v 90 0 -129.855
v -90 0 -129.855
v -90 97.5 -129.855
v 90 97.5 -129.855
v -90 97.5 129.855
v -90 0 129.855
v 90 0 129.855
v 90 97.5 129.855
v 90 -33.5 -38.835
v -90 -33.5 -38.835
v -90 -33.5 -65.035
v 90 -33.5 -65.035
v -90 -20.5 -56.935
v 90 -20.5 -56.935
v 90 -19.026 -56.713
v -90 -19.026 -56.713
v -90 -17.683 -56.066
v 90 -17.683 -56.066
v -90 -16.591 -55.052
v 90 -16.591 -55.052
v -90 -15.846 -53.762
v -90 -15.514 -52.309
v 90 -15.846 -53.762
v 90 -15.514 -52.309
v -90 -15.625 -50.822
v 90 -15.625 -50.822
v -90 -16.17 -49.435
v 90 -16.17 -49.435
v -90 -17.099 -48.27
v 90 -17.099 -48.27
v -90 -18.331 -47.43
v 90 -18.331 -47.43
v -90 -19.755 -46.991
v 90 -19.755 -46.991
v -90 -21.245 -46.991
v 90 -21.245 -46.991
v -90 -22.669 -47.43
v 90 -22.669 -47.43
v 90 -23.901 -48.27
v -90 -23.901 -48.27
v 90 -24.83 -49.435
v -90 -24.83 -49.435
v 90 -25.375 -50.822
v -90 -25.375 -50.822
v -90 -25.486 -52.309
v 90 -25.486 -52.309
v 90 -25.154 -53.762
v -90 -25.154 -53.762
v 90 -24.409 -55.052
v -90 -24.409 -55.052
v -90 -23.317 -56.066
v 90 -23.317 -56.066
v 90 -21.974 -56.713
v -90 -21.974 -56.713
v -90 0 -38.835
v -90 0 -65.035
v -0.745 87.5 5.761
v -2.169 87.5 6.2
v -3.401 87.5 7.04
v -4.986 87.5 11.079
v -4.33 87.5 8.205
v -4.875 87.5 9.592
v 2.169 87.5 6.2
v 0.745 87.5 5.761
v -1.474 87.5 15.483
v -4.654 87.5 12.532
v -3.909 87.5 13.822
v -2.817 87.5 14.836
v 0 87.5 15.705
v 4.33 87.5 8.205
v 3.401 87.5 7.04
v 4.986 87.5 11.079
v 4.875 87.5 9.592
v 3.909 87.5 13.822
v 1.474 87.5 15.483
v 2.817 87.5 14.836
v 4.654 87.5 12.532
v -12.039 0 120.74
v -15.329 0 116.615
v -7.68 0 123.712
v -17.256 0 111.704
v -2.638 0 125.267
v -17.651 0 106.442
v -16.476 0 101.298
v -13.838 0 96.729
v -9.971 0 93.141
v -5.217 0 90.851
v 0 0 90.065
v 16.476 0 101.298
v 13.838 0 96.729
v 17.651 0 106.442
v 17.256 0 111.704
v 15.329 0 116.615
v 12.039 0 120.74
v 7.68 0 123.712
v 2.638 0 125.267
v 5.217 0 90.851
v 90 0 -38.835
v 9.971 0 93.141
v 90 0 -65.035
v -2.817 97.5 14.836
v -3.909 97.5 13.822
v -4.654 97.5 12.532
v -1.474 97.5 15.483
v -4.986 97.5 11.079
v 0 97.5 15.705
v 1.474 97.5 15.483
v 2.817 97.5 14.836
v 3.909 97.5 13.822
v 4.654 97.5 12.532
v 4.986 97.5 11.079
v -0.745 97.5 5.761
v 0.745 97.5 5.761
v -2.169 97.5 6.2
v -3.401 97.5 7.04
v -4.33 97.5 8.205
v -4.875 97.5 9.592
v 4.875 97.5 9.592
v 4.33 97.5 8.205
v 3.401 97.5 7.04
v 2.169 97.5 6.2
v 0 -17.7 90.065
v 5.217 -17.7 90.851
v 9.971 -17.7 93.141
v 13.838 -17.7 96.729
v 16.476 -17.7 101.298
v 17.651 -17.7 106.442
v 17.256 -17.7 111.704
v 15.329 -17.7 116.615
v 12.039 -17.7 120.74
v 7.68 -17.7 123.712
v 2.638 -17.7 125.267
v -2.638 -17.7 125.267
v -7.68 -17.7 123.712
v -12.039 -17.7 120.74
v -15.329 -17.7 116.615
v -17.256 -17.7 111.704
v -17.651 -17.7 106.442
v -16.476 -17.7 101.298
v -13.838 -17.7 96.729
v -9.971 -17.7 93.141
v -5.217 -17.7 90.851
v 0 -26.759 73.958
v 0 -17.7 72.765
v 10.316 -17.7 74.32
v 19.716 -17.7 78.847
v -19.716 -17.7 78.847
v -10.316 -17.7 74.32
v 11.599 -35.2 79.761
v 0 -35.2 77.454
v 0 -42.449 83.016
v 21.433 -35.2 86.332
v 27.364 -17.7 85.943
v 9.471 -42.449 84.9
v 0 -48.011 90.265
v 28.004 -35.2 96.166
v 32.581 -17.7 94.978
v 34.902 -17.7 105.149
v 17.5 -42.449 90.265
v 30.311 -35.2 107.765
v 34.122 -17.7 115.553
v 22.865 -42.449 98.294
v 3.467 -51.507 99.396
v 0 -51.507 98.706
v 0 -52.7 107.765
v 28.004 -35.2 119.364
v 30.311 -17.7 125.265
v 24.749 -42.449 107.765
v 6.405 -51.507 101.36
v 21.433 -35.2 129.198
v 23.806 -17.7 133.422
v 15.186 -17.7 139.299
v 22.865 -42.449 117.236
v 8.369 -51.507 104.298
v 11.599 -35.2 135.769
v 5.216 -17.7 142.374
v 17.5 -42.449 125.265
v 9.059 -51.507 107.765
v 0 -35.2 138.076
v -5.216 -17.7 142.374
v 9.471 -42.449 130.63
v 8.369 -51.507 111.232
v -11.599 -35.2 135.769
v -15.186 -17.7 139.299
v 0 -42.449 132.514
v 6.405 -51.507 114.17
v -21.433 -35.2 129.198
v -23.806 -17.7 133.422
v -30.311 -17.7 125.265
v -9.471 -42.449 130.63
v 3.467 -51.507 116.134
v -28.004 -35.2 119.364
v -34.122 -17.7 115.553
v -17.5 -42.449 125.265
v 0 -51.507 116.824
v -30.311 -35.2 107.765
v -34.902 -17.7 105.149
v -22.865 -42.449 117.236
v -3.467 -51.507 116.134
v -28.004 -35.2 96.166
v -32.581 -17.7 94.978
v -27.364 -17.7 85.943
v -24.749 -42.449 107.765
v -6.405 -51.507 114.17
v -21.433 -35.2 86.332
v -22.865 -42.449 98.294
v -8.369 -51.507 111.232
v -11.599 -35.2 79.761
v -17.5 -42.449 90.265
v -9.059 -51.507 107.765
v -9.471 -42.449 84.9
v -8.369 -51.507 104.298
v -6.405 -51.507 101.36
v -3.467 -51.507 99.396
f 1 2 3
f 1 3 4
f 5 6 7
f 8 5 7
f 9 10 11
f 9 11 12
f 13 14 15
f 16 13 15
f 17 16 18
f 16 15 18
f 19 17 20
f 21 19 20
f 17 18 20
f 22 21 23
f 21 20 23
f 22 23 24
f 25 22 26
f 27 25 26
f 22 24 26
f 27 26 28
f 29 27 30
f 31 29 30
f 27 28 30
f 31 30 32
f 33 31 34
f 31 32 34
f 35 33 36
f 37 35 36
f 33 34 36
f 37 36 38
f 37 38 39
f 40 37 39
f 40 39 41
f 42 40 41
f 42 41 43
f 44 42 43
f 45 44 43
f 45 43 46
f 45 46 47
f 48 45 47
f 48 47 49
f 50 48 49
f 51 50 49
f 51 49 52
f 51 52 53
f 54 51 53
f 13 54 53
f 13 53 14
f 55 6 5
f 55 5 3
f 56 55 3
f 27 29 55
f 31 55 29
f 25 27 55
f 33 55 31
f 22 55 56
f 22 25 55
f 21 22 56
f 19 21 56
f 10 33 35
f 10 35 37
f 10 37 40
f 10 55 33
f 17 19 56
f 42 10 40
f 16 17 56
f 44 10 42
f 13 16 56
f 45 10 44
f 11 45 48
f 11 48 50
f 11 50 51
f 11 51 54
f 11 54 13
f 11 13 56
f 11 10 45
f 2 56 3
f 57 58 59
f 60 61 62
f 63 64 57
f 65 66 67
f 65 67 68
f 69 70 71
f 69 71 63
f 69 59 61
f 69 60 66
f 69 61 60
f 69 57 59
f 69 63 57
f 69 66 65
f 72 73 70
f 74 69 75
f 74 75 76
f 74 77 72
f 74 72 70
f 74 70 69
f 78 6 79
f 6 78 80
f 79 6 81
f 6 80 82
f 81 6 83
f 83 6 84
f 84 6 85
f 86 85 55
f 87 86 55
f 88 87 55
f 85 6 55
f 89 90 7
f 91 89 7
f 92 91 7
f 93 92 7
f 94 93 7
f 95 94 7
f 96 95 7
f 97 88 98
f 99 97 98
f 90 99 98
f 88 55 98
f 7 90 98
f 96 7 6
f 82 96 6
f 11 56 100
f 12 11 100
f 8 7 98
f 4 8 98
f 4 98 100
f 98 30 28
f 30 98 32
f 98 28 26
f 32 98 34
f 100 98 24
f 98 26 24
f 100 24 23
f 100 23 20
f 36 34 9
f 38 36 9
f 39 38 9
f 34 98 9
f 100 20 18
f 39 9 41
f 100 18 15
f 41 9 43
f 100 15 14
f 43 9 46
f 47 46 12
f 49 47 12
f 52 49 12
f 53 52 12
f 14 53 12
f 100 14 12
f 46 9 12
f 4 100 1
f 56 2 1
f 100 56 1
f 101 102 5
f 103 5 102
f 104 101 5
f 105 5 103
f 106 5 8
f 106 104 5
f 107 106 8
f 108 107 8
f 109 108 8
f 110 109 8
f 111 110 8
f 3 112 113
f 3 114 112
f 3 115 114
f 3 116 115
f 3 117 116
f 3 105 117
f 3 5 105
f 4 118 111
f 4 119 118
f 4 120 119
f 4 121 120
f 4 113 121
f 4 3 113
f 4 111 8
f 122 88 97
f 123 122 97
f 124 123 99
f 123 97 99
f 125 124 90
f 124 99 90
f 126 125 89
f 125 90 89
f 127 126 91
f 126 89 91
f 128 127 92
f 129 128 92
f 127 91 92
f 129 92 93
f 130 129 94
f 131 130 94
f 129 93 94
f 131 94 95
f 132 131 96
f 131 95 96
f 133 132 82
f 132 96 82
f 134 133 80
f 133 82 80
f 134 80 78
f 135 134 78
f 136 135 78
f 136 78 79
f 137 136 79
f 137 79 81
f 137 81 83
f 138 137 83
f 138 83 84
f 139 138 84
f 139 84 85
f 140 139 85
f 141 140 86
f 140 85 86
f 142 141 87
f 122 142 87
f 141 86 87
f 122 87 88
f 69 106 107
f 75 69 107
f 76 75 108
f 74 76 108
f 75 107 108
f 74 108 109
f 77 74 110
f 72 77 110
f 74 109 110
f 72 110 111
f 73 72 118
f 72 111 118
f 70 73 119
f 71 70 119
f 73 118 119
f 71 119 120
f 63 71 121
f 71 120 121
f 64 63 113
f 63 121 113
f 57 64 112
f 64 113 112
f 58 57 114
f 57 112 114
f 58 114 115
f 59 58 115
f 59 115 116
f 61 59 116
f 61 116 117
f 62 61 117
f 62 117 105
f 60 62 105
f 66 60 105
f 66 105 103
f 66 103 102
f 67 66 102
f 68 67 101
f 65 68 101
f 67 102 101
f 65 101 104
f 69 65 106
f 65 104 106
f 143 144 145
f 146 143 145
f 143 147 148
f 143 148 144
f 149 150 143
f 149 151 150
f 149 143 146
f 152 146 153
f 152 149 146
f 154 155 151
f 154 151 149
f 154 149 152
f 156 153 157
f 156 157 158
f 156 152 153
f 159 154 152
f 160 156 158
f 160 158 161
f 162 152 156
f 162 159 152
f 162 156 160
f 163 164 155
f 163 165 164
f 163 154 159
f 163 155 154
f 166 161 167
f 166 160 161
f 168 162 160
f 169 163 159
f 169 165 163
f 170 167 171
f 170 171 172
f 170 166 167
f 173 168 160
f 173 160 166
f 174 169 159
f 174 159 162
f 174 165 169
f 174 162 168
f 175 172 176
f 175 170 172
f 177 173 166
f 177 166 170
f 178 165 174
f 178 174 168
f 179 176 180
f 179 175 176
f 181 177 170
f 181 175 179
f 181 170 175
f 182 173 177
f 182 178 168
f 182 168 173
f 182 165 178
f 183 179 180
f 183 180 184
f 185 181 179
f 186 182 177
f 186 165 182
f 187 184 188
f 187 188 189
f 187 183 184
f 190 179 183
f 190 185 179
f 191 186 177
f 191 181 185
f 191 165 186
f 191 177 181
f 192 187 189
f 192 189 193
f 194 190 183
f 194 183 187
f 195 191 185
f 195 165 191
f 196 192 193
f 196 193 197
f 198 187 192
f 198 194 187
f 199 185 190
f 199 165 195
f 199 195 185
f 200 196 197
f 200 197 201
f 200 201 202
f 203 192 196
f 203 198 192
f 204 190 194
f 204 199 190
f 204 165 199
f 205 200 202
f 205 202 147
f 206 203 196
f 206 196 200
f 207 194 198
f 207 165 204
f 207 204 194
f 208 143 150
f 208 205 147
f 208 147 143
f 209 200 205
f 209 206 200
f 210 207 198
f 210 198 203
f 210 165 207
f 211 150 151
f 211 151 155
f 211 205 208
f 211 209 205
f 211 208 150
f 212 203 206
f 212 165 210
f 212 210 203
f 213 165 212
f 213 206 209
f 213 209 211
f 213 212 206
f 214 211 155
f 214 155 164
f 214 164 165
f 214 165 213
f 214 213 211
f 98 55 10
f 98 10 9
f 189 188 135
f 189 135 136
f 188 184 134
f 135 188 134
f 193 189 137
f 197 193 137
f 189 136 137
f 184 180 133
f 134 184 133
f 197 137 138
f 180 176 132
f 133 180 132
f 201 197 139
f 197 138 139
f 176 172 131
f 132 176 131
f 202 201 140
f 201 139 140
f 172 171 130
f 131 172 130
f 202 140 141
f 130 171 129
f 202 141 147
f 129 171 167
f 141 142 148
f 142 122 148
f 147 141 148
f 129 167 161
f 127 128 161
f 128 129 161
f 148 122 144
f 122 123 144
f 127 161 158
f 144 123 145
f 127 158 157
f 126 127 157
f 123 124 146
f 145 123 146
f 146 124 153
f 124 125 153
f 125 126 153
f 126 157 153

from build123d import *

# Parameters (mm, degrees)
SKETCH2_W           = 180
SKETCH2_H           = 259.71
BOSS_EXTRUDE1_DEPTH = 97.5
SKETCH4_R           = 17.7
BOSS_EXTRUDE2_DEPTH = 17.7
SKETCH5_R           = 35
BOSS_EXTRUDE3_DEPTH = 35
FILLET2_R           = 35
SKETCH8_W           = 180
SKETCH8_H           = 26.2
BOSS_EXTRUDE4_DEPTH = 33.5
SKETCH9_R           = 5
CUT_EXTRUDE1_DEPTH  = 250.575830668
SKETCH10_R          = 5
CUT_EXTRUDE2_DEPTH  = 10


with BuildPart() as part:
    # Sketch2 → Boss-Extrude1 (new body)
    with BuildSketch(Plane(origin=(0, 0, 0), x_dir=(1, 0, 0), z_dir=(0, 1, 0))):
        Rectangle(SKETCH2_W, SKETCH2_H)
    extrude(amount=BOSS_EXTRUDE1_DEPTH)

    # Sketch4 → Boss-Extrude2 (add)
    with BuildSketch(Plane.XZ):
        with Locations(Location((0, 107.765, 0), (0, 0, 270))):
            Circle(SKETCH4_R)
    extrude(amount=BOSS_EXTRUDE2_DEPTH)

    # Sketch5 → Boss-Extrude3 (add)
    with BuildSketch(Plane.XZ.offset(17.7)):
        with Locations(Location((0, 107.765, 0), (0, 0, 270))):
            Circle(SKETCH5_R)
    extrude(amount=BOSS_EXTRUDE3_DEPTH)

    # Fillet2
    fillet2_edges = [part.edges().sort_by_distance(p)[0] for p in [
        (0, -52.7, 142.765),
    ]]
    fillet(fillet2_edges, radius=FILLET2_R - 0.0001)  # a hair under: the kernel refuses the full size

    # Sketch8 → Boss-Extrude4 (add)
    with BuildSketch(Plane.XZ):
        with Locations((0, -51.935)):
            Rectangle(SKETCH8_W, SKETCH8_H)
    extrude(amount=BOSS_EXTRUDE4_DEPTH)

    # Sketch9 → Cut-Extrude1 (cut, through all)
    with BuildSketch(Plane(origin=(90, 0, 0), x_dir=(0, 0, -1), z_dir=(1, 0, 0))):
        with Locations((51.935, -20.5)):
            Circle(SKETCH9_R)
    extrude(amount=-CUT_EXTRUDE1_DEPTH, mode=Mode.SUBTRACT)

    # Sketch10 → Cut-Extrude2 (cut)
    with BuildSketch(Plane(origin=(0, 97.5, 0), x_dir=(1, 0, 0), z_dir=(0, 1, 0))):
        with Locations(Location((0, -10.705, 0), (0, 0, 270))):
            Circle(SKETCH10_R)
    extrude(amount=-CUT_EXTRUDE2_DEPTH, mode=Mode.SUBTRACT)


solid = part.part
